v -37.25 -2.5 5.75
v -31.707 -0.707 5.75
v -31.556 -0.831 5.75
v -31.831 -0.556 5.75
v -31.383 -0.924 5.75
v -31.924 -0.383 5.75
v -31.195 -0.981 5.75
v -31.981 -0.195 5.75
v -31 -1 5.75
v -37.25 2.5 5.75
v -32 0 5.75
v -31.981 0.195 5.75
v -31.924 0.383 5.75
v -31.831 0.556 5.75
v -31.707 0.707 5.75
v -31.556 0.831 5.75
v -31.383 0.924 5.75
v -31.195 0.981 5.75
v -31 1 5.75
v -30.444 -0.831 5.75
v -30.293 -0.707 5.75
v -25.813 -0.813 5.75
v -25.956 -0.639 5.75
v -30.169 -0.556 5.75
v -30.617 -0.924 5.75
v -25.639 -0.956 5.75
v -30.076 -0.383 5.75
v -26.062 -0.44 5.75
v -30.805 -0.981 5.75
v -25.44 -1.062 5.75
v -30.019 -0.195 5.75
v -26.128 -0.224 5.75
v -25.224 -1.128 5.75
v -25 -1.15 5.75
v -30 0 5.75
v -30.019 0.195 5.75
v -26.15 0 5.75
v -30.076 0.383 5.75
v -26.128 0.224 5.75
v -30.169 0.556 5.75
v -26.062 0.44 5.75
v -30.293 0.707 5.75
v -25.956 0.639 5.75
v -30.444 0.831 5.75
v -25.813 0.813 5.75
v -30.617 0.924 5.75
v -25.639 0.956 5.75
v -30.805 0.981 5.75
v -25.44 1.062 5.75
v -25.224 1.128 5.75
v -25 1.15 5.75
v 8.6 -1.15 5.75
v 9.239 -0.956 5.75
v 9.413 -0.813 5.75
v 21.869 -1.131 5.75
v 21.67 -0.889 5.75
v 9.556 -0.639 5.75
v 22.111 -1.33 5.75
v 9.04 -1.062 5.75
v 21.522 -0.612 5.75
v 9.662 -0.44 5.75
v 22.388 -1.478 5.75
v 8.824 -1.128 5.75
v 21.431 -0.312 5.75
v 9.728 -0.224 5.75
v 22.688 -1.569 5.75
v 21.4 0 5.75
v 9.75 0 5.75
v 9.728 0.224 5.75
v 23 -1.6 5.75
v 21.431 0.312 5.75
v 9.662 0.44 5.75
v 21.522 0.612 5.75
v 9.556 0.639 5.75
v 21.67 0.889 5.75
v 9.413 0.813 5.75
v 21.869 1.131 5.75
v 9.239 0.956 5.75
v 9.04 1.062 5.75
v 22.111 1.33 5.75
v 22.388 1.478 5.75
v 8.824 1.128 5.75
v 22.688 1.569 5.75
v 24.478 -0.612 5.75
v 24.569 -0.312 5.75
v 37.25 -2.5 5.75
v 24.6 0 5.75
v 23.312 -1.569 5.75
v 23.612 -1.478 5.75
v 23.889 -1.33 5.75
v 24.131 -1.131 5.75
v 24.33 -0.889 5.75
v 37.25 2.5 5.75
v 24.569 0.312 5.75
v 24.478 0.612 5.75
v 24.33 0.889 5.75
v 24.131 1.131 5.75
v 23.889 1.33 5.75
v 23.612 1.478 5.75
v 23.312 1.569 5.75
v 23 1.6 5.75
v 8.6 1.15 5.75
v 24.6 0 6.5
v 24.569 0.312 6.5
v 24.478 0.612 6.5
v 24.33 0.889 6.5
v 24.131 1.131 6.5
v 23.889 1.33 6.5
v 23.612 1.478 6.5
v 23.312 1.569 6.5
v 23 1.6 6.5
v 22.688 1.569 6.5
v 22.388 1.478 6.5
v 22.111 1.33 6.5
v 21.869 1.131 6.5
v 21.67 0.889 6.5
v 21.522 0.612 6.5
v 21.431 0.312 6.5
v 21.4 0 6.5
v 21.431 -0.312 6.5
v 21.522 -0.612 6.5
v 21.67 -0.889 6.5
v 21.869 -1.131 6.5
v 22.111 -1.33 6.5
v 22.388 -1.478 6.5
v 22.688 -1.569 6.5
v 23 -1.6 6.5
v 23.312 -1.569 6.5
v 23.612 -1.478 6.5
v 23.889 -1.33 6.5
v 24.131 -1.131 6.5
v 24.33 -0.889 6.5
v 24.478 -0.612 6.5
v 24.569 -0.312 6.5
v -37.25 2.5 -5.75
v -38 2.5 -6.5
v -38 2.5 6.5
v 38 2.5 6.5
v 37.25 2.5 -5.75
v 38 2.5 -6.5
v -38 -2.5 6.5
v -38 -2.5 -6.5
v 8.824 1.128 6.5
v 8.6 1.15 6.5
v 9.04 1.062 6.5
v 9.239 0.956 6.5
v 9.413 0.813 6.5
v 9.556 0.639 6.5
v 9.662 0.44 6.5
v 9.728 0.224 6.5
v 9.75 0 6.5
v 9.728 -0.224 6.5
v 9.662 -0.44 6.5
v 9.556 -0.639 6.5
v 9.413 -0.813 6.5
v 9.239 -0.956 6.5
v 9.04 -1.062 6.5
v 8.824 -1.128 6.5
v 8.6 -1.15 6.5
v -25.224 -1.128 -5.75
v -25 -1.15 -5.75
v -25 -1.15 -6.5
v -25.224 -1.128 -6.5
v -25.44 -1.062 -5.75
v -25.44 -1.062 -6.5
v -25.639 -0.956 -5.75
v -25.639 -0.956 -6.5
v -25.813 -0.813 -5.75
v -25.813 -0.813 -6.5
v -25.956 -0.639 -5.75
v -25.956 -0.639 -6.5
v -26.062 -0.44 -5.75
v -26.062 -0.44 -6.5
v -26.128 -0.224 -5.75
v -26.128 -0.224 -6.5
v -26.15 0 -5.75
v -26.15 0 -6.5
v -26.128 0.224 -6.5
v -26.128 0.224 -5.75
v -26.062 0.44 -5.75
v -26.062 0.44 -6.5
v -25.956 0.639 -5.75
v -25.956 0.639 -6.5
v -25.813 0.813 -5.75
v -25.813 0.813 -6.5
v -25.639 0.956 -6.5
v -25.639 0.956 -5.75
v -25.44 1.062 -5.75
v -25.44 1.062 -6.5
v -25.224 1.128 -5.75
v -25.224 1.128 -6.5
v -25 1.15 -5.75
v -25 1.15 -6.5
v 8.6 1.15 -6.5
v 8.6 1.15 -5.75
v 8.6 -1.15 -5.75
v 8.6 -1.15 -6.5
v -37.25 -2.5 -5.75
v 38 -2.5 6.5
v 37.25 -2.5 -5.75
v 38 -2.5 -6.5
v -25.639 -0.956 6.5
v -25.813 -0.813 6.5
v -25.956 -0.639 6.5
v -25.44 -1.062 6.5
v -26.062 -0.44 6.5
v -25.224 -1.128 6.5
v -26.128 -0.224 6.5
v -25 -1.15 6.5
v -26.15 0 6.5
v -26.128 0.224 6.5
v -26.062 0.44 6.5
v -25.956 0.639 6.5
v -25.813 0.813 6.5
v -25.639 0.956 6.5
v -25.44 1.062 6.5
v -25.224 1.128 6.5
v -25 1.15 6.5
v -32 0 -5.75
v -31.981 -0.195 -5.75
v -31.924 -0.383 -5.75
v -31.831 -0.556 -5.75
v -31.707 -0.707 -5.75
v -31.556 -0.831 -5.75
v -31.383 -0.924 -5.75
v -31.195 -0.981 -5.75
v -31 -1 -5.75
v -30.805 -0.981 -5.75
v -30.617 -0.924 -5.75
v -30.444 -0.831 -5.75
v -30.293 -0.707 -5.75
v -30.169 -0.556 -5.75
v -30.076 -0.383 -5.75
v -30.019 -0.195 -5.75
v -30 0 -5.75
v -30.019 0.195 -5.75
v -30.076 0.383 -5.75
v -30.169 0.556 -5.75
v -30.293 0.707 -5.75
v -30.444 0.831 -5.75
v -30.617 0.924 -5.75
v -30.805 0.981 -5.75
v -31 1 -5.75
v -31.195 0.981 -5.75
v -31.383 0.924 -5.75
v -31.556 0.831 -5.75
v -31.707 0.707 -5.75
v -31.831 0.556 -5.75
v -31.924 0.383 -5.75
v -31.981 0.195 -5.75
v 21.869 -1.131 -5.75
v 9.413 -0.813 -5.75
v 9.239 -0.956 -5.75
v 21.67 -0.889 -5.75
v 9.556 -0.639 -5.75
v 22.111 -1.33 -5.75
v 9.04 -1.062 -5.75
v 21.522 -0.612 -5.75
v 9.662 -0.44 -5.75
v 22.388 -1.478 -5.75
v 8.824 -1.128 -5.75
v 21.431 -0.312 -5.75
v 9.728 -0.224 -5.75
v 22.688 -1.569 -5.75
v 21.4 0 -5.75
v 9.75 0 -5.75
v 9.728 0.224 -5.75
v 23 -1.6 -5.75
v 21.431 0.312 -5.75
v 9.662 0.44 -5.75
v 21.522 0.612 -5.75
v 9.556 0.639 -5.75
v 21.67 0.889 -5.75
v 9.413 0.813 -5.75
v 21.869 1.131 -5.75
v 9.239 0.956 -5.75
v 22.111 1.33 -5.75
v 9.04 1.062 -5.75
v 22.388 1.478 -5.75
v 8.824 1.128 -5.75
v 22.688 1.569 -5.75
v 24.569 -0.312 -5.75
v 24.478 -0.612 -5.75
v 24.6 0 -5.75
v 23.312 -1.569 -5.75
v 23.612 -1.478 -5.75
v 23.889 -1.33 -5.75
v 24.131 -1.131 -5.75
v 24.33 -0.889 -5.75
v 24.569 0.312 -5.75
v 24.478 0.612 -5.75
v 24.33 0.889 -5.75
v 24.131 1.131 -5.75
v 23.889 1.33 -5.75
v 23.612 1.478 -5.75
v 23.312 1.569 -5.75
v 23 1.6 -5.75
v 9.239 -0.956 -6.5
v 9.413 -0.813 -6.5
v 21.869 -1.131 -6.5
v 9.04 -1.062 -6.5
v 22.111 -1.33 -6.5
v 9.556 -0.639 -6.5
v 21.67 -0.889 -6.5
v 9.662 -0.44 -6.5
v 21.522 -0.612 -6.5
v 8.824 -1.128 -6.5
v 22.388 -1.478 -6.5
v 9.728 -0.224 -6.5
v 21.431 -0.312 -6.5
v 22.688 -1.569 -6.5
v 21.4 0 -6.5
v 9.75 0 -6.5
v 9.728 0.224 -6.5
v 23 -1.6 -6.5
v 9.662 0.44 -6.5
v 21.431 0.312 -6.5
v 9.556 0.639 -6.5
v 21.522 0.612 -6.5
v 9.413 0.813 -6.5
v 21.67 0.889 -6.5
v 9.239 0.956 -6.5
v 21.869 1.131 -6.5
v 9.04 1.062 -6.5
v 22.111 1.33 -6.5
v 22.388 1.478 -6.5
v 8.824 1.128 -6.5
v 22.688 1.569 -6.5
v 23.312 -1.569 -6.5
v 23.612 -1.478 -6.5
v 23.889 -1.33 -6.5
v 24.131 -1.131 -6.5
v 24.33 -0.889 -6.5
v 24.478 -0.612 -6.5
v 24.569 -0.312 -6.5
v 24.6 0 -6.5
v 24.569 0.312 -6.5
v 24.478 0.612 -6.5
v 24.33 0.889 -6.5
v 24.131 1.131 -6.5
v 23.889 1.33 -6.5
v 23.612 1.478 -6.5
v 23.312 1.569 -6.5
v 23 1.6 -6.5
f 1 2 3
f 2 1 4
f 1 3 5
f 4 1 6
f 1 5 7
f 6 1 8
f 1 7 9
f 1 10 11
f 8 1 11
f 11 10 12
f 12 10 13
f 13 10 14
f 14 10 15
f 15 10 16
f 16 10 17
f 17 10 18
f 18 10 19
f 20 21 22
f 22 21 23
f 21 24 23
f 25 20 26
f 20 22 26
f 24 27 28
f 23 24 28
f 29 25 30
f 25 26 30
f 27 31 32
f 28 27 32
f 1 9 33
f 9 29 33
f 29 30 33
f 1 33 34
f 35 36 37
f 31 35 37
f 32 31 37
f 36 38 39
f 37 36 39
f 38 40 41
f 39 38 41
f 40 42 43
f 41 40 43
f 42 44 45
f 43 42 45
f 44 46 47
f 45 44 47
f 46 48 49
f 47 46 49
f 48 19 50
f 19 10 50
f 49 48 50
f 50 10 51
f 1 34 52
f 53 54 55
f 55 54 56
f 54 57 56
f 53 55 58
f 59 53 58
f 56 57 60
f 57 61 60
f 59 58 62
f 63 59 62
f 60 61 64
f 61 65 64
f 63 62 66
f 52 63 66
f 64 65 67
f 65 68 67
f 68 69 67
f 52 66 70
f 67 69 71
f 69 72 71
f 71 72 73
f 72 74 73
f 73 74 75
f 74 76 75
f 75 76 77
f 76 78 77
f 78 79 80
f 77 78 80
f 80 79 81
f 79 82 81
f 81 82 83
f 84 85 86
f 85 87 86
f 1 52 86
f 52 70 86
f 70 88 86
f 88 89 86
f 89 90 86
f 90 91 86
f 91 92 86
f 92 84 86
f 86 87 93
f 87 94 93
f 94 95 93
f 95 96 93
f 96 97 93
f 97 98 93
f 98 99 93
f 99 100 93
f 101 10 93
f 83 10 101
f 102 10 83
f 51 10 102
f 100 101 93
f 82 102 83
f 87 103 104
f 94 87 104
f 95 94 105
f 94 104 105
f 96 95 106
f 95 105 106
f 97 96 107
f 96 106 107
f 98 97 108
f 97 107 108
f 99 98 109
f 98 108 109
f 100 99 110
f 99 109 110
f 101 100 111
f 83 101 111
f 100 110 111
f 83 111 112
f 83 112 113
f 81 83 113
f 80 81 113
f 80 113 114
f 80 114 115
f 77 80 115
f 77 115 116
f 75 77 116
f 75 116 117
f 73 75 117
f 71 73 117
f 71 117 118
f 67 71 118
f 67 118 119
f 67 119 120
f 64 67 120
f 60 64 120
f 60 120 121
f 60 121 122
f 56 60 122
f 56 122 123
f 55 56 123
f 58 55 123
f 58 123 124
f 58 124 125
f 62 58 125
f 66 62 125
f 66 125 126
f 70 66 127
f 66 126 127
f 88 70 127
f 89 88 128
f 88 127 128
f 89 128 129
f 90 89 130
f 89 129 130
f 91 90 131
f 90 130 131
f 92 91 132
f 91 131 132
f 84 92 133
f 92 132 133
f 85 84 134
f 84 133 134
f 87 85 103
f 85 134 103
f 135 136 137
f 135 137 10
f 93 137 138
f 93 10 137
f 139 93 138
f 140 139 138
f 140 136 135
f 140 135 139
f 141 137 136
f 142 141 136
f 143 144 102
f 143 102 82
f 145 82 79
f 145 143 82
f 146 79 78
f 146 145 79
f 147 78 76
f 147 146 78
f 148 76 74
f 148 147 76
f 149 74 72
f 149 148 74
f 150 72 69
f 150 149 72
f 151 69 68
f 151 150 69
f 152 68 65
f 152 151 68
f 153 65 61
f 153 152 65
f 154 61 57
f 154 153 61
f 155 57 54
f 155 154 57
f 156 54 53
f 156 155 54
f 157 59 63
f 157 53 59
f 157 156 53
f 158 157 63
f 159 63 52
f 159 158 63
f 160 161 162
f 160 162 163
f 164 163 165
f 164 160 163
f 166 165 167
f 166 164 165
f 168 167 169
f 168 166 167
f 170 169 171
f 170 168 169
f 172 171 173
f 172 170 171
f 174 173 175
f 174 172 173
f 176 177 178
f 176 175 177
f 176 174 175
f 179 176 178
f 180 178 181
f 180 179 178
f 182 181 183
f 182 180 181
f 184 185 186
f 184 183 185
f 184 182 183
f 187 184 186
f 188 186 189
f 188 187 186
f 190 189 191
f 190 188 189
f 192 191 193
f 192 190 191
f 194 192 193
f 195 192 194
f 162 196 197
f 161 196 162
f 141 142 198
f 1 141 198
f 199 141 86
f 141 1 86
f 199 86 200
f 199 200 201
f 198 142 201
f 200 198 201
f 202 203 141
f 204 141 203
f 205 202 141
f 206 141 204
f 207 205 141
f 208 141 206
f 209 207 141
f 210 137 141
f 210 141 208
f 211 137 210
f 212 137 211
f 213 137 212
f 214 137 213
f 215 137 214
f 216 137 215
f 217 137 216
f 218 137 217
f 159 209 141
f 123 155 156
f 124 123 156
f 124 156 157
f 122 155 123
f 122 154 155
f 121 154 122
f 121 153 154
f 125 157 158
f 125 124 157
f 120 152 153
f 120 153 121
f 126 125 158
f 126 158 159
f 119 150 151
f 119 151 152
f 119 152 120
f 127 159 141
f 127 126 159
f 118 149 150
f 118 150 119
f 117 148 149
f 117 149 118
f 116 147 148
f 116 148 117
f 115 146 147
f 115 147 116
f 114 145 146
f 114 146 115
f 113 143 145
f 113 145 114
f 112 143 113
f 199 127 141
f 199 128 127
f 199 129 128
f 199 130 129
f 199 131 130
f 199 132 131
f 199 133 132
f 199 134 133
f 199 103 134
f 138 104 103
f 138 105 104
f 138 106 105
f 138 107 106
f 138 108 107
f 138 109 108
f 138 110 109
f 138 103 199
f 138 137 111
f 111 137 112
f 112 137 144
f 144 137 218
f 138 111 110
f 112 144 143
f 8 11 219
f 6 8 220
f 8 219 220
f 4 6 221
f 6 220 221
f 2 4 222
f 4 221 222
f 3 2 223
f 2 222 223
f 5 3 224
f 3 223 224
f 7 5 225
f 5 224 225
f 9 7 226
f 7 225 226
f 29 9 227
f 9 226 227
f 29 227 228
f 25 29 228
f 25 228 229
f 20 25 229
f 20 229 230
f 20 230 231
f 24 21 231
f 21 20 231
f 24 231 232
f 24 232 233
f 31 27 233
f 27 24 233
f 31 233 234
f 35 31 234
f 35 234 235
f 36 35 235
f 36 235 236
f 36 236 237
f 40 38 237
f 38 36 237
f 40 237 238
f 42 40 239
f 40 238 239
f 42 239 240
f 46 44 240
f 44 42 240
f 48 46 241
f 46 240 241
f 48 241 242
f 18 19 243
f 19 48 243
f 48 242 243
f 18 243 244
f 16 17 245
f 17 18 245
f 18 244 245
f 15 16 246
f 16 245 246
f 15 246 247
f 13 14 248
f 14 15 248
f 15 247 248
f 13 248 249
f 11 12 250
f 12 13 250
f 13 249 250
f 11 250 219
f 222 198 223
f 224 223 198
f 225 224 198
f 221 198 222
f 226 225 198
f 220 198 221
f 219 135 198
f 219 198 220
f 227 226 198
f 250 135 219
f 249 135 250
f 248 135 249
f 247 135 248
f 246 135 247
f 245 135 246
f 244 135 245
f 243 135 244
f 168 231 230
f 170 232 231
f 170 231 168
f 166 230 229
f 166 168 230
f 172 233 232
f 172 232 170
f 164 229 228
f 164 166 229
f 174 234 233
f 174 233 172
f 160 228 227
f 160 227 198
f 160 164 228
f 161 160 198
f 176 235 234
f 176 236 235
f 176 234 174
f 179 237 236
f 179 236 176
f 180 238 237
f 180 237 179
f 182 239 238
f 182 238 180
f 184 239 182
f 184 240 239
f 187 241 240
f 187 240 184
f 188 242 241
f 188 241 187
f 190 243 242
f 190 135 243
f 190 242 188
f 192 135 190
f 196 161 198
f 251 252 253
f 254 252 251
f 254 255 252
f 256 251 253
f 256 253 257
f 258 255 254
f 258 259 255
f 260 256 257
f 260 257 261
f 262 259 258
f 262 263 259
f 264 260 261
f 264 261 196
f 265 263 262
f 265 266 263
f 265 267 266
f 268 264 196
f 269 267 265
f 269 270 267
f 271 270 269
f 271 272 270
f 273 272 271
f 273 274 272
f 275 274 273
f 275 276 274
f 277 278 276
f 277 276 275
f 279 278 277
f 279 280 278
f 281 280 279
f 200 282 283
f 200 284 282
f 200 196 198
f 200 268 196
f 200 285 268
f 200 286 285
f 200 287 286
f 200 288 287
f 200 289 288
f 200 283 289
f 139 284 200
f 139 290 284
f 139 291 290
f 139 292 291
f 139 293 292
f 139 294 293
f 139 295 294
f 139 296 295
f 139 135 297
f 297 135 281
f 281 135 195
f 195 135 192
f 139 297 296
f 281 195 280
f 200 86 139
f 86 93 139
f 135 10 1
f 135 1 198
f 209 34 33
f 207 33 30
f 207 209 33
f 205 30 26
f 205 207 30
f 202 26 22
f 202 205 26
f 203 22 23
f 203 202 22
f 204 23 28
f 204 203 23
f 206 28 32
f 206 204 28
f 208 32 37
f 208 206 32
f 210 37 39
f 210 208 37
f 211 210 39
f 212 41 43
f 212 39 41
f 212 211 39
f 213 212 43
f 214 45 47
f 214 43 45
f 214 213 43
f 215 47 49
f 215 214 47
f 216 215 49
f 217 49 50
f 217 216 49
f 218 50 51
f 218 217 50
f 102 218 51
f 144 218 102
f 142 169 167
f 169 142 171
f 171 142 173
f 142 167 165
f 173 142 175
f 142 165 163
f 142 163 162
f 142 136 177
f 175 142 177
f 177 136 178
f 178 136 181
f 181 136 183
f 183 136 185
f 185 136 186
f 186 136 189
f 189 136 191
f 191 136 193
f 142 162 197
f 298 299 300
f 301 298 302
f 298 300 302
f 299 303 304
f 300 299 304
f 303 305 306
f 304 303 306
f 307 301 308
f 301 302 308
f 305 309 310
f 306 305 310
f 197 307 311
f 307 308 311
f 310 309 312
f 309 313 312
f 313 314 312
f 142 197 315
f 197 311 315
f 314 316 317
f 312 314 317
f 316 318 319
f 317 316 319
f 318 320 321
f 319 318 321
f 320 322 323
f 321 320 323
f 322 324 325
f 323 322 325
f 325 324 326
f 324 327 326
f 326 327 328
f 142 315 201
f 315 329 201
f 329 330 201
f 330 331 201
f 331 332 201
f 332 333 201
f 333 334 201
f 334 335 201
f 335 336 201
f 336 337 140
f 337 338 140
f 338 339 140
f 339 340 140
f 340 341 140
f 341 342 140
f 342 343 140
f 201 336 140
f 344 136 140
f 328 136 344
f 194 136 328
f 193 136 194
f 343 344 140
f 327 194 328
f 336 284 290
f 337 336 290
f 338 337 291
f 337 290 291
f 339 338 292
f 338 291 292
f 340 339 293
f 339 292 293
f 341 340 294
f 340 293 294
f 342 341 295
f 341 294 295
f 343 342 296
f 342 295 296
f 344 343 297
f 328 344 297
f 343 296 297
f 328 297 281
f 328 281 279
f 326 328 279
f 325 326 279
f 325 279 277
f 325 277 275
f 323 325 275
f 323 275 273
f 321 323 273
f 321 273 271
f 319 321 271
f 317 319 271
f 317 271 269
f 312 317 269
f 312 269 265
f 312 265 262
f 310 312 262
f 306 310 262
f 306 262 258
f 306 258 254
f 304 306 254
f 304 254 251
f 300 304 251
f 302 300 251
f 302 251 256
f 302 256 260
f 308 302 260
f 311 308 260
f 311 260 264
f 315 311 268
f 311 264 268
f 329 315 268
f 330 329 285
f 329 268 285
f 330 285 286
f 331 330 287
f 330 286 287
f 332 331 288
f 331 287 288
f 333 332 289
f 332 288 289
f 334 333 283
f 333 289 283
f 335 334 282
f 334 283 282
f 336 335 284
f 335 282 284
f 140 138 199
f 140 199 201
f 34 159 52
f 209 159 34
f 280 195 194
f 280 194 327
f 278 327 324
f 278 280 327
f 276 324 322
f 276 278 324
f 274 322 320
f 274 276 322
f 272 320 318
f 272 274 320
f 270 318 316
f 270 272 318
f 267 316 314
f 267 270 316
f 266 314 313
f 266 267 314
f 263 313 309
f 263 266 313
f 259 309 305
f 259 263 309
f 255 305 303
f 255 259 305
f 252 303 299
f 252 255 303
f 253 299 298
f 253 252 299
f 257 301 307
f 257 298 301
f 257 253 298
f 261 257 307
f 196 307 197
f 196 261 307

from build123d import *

# Parameters (mm, degrees)
SKETCH1_W           = 76
SKETCH1_H           = 13
SKETCH1_W_2         = 74.5
SKETCH1_H_2         = 11.5
BOSS_EXTRUDE1_DEPTH = 2.5
SKETCH2_R           = 1.6
CUT_EXTRUDE1_DEPTH  = 41.239905566
BOSS_EXTRUDE2_REACH = 42.004
SKETCH3_R           = 1


with BuildPart() as part:
    # Sketch1 → Boss-Extrude1 (new, symmetric)
    with BuildSketch(Plane(origin=(0, 0, 0), x_dir=(1, 0, 0), z_dir=(0, 1, 0))):
        Rectangle(SKETCH1_W, SKETCH1_H)
        Rectangle(SKETCH1_W_2, SKETCH1_H_2, mode=Mode.SUBTRACT)
    extrude(amount=BOSS_EXTRUDE1_DEPTH, both=True)

    # Sketch2 → Cut-Extrude1 (cut, through all)
    with BuildSketch(Plane.XY.offset(6.5)):
        with Locations((23, 0)):
            Circle(SKETCH2_R)
        with BuildLine():
            Line((-25, 1.15), (8.6, 1.15))
            ThreePointArc((8.6, 1.15), (9.75, 0), (8.6, -1.15))
            Line((8.6, -1.15), (-25, -1.15))
            ThreePointArc((-25, -1.15), (-26.15, 0), (-25, 1.15))
        make_face()
    extrude(amount=-CUT_EXTRUDE1_DEPTH, mode=Mode.SUBTRACT)

    # Sketch3 → Boss-Extrude2 (add, up to next)
    with BuildSketch(Plane.XY.offset(-5.75), mode=Mode.PRIVATE) as boss_extrude2_sk1:
        with Locations(Location((-31, 0, 0), (0, 0, 180))):
            Circle(SKETCH3_R)
    boss_extrude2_tool1 = extrude(boss_extrude2_sk1.sketch, amount=BOSS_EXTRUDE2_REACH, mode=Mode.PRIVATE) - part.part
    add(boss_extrude2_tool1.solids().sort_by_distance((-31, 0, -5.75))[0])


solid = part.part
